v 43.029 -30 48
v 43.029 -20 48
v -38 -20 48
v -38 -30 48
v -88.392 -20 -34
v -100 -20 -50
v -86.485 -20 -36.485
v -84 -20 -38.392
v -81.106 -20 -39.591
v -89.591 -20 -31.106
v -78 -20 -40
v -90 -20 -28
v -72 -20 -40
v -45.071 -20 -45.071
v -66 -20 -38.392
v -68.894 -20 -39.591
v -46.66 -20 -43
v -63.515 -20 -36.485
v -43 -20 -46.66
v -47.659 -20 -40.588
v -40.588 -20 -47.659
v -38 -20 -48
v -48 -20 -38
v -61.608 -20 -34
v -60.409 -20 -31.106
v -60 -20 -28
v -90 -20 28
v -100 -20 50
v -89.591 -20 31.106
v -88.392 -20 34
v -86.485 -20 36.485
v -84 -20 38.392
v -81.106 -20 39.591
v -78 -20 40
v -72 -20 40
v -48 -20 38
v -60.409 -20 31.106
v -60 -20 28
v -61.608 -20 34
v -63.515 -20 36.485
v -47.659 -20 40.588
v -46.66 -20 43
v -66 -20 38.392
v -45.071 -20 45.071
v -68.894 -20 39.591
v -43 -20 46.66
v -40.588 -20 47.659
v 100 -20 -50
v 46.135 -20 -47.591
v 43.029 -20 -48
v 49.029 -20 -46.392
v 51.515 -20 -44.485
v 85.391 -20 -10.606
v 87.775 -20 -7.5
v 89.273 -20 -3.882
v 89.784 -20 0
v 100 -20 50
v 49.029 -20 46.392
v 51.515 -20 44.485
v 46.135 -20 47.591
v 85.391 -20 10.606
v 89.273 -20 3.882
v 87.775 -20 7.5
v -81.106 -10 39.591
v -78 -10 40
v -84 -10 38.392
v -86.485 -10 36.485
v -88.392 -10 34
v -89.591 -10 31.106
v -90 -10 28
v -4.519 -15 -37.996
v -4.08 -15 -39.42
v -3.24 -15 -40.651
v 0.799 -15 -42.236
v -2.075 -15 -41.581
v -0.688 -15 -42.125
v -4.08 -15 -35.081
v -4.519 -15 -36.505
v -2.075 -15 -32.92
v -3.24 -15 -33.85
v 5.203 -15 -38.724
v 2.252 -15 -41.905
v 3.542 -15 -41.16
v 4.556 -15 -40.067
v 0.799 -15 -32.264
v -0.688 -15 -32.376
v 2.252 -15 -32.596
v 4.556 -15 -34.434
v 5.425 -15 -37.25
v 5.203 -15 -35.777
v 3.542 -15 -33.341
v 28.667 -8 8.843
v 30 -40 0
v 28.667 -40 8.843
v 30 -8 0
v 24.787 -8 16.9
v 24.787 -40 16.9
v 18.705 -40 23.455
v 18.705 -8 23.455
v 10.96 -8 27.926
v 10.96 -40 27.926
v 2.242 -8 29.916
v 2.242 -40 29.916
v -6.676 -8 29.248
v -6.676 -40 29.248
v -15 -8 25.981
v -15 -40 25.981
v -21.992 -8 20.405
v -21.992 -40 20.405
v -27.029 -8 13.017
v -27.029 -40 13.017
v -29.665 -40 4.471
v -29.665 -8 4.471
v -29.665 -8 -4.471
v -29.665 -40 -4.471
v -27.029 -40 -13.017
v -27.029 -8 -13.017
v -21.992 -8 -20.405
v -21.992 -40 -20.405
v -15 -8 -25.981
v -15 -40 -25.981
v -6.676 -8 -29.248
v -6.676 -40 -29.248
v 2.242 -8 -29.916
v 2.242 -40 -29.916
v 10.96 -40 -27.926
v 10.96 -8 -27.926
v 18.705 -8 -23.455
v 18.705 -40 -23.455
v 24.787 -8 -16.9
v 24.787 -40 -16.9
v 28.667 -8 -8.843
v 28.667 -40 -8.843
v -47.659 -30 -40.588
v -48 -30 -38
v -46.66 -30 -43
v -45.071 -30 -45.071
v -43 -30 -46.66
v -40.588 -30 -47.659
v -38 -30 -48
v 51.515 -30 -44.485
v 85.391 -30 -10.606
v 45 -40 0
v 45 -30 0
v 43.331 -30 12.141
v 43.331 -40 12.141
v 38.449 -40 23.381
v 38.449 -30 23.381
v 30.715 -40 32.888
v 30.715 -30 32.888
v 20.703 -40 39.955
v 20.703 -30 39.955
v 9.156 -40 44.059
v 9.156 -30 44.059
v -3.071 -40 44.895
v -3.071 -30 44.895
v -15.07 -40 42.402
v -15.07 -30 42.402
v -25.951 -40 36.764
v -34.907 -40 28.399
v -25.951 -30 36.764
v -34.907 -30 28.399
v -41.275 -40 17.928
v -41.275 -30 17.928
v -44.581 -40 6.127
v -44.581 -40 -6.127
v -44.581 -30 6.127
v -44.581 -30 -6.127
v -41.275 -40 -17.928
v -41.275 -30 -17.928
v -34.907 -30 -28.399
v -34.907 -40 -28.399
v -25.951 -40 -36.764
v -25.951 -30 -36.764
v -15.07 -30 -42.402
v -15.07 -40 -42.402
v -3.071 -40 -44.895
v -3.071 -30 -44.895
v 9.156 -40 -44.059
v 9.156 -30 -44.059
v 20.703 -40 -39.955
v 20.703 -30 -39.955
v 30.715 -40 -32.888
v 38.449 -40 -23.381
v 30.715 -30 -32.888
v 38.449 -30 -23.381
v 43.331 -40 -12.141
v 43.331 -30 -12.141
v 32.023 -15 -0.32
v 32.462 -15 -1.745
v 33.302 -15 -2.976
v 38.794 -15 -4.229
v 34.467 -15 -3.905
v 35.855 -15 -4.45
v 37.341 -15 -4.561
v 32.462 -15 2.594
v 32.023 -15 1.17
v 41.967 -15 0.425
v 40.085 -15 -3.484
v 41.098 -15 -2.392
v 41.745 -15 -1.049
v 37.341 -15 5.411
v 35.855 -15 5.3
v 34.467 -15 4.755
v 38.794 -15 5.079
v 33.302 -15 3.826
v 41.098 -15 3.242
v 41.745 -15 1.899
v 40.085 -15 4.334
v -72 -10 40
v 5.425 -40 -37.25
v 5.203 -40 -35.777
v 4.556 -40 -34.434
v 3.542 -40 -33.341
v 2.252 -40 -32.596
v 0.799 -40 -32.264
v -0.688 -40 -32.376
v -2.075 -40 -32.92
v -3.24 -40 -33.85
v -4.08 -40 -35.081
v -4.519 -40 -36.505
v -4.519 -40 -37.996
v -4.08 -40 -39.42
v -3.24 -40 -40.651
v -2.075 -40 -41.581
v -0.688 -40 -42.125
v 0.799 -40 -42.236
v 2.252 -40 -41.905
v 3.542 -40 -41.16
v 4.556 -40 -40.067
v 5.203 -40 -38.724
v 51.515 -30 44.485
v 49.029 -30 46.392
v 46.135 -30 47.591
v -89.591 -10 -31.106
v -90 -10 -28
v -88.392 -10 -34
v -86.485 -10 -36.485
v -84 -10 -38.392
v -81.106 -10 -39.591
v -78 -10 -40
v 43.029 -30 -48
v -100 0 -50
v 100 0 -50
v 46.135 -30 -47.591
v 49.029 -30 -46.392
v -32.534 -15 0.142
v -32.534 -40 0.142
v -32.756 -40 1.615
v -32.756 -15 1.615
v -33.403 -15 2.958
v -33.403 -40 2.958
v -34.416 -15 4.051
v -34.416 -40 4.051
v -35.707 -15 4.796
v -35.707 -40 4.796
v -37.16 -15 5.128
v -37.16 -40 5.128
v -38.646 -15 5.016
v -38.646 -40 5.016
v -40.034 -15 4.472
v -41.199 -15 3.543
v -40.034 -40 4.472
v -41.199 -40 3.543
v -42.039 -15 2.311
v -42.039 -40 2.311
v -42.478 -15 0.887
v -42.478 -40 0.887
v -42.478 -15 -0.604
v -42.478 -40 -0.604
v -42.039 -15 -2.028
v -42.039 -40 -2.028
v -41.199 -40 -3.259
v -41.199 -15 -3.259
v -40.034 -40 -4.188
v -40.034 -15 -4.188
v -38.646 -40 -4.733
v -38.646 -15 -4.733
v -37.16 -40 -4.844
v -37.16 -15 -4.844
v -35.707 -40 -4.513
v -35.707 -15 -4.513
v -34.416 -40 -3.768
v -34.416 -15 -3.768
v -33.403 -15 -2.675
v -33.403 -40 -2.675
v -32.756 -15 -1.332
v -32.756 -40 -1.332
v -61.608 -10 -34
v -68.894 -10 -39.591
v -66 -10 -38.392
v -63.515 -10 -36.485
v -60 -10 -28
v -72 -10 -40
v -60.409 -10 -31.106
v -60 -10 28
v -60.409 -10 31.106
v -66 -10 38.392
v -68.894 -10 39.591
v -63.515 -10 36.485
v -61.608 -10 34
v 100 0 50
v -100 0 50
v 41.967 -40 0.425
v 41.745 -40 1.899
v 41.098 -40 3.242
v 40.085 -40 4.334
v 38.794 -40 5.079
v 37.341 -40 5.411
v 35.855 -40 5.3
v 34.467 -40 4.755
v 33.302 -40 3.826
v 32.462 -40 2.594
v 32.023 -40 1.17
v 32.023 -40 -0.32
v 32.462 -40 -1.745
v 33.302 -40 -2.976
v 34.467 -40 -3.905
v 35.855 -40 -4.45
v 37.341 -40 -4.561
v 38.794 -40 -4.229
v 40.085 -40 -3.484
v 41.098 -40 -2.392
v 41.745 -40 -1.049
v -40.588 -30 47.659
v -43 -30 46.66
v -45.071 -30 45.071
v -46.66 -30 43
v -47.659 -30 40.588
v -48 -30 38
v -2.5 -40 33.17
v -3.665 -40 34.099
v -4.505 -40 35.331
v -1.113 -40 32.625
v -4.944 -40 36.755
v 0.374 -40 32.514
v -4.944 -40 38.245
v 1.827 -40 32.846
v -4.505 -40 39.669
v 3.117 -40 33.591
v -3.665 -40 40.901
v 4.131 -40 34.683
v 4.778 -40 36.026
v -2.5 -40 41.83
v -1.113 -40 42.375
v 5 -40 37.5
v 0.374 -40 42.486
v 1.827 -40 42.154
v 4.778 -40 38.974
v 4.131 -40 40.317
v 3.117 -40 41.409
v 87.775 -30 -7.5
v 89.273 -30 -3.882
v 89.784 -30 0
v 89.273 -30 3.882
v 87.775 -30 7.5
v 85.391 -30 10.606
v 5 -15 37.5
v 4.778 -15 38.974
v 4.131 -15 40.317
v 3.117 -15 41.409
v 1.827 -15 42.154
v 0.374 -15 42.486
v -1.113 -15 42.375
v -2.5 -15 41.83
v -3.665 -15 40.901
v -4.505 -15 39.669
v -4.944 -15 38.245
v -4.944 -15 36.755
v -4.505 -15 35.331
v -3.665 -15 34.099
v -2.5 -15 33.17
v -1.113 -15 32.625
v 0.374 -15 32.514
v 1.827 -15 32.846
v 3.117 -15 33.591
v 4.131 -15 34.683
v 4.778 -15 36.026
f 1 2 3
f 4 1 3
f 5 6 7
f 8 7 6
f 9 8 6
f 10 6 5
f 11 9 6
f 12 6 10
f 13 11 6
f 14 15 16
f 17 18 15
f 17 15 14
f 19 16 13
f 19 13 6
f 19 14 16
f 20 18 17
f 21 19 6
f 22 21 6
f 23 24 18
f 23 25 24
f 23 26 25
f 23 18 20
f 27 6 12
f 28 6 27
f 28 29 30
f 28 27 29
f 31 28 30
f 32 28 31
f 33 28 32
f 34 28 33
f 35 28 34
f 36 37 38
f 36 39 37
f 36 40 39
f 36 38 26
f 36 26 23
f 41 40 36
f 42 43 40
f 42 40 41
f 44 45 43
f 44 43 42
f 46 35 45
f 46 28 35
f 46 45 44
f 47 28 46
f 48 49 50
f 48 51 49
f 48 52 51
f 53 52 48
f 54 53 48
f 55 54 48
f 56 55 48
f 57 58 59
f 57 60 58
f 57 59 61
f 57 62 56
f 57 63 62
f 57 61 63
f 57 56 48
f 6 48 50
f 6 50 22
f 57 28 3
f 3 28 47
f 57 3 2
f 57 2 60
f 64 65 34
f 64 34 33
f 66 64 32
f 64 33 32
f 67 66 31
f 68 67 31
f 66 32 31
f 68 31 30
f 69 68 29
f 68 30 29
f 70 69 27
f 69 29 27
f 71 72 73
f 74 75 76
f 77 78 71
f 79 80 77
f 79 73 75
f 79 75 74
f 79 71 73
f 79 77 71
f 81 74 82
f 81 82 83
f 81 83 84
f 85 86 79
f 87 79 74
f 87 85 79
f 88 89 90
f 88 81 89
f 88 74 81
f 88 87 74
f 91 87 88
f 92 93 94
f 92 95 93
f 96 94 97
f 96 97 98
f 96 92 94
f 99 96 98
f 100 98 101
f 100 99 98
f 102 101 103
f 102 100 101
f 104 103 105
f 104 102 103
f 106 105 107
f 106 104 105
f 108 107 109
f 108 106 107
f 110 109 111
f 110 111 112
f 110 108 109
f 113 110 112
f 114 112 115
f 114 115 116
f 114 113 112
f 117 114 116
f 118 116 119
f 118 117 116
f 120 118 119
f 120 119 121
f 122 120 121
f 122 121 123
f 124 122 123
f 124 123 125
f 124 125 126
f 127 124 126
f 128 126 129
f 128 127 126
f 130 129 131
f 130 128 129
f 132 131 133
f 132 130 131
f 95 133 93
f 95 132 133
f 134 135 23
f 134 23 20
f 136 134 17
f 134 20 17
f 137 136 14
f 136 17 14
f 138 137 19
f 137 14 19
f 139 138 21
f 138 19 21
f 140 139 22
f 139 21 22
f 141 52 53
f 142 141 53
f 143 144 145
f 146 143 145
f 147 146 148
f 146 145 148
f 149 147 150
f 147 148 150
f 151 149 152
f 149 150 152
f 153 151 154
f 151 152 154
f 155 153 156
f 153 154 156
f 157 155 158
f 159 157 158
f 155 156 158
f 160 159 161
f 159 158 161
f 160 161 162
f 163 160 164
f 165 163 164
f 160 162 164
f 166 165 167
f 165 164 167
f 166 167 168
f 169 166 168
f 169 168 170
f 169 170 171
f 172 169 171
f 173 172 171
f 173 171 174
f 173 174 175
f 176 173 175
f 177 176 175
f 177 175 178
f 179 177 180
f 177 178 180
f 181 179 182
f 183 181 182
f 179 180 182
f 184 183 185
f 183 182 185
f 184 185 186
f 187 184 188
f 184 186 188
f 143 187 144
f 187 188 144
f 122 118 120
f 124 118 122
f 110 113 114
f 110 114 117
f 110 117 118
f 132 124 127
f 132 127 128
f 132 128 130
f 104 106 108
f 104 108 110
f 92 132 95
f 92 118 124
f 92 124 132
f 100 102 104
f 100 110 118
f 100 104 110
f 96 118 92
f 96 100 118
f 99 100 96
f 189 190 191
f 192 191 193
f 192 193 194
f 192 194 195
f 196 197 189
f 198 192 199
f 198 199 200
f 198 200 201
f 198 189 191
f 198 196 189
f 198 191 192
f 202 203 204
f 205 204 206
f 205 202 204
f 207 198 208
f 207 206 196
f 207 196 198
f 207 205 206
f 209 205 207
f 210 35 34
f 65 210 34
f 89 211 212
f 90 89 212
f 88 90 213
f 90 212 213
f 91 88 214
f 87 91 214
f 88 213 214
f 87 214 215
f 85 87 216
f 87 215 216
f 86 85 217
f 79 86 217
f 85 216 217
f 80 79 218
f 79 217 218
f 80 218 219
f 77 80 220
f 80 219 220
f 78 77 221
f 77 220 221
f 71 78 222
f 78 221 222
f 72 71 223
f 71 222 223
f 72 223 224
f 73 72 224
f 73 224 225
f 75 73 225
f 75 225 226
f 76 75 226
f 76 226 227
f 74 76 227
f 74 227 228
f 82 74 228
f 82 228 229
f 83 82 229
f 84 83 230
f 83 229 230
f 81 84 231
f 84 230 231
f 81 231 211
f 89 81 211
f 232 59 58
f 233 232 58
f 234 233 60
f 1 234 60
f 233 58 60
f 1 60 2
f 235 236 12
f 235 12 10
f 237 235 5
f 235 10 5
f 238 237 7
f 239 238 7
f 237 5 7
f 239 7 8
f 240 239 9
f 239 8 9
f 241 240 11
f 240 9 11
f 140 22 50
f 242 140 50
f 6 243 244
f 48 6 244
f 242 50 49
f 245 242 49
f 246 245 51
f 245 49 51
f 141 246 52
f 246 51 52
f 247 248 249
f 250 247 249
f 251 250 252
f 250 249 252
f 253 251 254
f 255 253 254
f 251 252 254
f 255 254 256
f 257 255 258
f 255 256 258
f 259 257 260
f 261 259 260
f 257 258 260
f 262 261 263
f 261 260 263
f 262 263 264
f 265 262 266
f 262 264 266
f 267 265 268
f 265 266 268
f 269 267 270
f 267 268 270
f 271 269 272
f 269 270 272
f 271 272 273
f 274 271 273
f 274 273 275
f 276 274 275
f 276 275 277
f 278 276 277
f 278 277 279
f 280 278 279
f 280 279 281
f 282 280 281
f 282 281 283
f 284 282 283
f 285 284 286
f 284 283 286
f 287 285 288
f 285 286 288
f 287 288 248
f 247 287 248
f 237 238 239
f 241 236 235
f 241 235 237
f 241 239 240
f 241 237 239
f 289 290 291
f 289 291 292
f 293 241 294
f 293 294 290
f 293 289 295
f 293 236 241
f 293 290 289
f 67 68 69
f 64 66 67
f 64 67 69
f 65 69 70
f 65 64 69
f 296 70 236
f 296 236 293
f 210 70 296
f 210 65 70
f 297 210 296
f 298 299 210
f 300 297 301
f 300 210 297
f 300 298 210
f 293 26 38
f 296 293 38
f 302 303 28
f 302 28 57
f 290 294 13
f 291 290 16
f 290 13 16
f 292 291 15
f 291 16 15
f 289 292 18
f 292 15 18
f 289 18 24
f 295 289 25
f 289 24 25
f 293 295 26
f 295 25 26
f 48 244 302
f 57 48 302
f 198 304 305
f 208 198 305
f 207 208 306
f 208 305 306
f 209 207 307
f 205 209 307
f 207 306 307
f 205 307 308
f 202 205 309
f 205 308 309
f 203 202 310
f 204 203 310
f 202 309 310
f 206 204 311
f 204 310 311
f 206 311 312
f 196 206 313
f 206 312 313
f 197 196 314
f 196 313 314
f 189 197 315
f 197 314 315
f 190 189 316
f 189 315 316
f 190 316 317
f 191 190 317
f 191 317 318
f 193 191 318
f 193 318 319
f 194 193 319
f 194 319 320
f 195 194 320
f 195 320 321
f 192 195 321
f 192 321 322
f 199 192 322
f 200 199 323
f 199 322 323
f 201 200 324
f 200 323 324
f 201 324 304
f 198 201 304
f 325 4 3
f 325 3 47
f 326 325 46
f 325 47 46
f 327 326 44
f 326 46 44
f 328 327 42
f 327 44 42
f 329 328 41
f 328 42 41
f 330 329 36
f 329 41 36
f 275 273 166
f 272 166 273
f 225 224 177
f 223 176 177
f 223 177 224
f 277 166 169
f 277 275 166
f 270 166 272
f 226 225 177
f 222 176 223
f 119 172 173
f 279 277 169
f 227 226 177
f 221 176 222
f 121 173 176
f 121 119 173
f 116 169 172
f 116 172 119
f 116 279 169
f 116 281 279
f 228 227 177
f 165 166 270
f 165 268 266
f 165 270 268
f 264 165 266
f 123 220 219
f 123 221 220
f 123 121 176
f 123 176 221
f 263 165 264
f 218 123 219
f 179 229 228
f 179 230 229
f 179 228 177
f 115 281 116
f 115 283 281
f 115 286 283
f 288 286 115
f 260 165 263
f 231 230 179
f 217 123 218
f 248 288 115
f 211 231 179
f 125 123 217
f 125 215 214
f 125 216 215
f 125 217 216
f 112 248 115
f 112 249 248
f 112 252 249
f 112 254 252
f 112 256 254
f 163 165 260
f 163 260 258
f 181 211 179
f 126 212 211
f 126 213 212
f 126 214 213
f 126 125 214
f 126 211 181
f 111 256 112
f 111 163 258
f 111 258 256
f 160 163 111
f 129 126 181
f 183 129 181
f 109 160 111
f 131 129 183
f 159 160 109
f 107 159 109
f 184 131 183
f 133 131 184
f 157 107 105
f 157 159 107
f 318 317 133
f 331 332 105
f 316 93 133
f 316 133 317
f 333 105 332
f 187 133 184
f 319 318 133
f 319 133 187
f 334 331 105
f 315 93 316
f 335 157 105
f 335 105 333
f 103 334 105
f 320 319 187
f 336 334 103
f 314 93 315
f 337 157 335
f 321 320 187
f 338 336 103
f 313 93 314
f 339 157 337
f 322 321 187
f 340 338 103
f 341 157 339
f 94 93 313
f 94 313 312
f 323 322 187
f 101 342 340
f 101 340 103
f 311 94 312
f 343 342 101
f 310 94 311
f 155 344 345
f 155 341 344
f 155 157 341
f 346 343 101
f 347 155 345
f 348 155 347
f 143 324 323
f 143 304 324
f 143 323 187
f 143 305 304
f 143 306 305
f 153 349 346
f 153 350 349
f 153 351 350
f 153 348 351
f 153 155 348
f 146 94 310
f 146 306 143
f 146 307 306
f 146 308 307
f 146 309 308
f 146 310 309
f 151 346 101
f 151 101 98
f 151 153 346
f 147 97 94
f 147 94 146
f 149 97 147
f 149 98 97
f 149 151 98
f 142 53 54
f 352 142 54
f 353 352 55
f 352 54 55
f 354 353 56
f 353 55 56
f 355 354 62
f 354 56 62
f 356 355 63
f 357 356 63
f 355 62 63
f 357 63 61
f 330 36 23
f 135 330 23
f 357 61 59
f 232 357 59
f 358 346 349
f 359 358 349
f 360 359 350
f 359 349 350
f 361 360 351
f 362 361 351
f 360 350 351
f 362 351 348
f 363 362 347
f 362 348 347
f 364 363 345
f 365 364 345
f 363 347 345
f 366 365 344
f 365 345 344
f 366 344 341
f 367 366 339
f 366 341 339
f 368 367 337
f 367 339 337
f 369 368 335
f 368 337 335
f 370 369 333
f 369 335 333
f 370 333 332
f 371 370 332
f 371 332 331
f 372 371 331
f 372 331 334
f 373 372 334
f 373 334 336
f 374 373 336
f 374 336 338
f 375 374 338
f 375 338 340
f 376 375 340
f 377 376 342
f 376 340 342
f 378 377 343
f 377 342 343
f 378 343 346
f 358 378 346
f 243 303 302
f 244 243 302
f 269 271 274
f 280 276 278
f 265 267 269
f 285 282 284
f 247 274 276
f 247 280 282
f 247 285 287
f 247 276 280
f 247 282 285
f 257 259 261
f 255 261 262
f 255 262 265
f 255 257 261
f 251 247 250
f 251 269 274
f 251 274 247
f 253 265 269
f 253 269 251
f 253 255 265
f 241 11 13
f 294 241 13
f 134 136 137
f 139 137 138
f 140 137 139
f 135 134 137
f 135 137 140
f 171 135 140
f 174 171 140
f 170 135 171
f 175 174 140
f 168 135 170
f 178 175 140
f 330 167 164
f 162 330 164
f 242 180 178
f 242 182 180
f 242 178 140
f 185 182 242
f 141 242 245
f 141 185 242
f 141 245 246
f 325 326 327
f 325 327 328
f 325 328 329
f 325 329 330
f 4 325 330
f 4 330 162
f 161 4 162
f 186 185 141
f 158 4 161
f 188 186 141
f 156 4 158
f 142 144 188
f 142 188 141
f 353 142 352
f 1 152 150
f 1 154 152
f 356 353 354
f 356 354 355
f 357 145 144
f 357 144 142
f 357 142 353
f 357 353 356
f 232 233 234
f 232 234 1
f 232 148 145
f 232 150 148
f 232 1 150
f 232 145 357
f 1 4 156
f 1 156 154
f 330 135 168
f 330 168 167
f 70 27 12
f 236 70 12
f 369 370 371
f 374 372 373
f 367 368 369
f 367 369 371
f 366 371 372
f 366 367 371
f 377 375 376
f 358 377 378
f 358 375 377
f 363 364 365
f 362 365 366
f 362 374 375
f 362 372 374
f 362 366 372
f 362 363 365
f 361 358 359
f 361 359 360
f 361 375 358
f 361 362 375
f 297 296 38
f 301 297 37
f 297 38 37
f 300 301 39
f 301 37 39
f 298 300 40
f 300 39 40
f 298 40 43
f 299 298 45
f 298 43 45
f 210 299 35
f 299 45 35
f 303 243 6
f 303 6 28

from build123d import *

# Parameters (mm, degrees)
F0_W      = 200
F0_H      = 100
F1_DEPTH  = 20
F3_DEPTH  = 10
F5_DEPTH  = 10
F6_R      = 45
F6_R_2    = 30
F7_DEPTH  = 10
F8_R      = 5
F9_DEPTH  = 25
F10_R     = 30
F11_DEPTH = 22


with BuildPart() as f1:
    # F0 (on Front) → F1 (new body)
    with BuildSketch(Plane.XZ):
        Rectangle(F0_W, F0_H)
    extrude(amount=F1_DEPTH)

    # F2 (on face) → F3 (cut)
    with BuildSketch(Plane.XZ.offset(20)):
        with BuildLine():
            Line((-72, 40), (-78, 40))
            ThreePointArc((-78, 40), (-86.485281, 36.485281), (-90, 28))
            Line((-90, 28), (-90, -28))
            ThreePointArc((-90, -28), (-86.485281, -36.485281), (-78, -40))
            Line((-78, -40), (-72, -40))
            ThreePointArc((-72, -40), (-63.514719, -36.485281), (-60, -28))
            Line((-60, -28), (-60, 28))
            ThreePointArc((-60, 28), (-63.514719, 36.485281), (-72, 40))
        make_face()
    extrude(amount=-F3_DEPTH, mode=Mode.SUBTRACT)

    # F4 (on face) → F5 (join)
    with BuildSketch(Plane.XZ.offset(20)):
        with BuildLine():
            Line((-38, -48), (43.029173, -48))
            ThreePointArc((43.029173, -48), (47.621583, -47.086468), (51.514773, -44.484963))
            Line((51.514773, -44.484963), (85.390988, -10.606203))
            ThreePointArc((85.390988, -10.606203), (89.783988, 0), (85.390988, 10.606203))
            Line((85.390988, 10.606203), (51.514773, 44.484963))
            ThreePointArc((51.514773, 44.484963), (47.621583, 47.086468), (43.029173, 48))
            Line((43.029173, 48), (-38, 48))
            ThreePointArc((-38, 48), (-45.071068, 45.071068), (-48, 38))
            Line((-48, 38), (-48, -38))
            ThreePointArc((-48, -38), (-45.071068, -45.071068), (-38, -48))
        make_face()
    extrude(amount=F5_DEPTH)

    # F6 (on face) → F7 (join)
    with BuildSketch(Plane.XZ.offset(30)):
        Circle(F6_R)
        Circle(F6_R_2, mode=Mode.SUBTRACT)
    extrude(amount=F7_DEPTH)

    # F8 (on face) → F9 (cut)
    with BuildSketch(Plane.XZ.offset(40)):
        with Locations((-37.533723, 0.141637)):
            Circle(F8_R)
        with Locations((36.967181, 0.42491)):
            Circle(F8_R)
        with Locations((0, 37.5)):
            Circle(F8_R)
        with Locations((0.424909, -37.250452)):
            Circle(F8_R)
    extrude(amount=-F9_DEPTH, mode=Mode.SUBTRACT)

    # F10 (on face) → F11 (cut)
    with BuildSketch(Plane.XZ.offset(30)):
        Circle(F10_R)
    extrude(amount=-F11_DEPTH, mode=Mode.SUBTRACT)


solid = f1.part
